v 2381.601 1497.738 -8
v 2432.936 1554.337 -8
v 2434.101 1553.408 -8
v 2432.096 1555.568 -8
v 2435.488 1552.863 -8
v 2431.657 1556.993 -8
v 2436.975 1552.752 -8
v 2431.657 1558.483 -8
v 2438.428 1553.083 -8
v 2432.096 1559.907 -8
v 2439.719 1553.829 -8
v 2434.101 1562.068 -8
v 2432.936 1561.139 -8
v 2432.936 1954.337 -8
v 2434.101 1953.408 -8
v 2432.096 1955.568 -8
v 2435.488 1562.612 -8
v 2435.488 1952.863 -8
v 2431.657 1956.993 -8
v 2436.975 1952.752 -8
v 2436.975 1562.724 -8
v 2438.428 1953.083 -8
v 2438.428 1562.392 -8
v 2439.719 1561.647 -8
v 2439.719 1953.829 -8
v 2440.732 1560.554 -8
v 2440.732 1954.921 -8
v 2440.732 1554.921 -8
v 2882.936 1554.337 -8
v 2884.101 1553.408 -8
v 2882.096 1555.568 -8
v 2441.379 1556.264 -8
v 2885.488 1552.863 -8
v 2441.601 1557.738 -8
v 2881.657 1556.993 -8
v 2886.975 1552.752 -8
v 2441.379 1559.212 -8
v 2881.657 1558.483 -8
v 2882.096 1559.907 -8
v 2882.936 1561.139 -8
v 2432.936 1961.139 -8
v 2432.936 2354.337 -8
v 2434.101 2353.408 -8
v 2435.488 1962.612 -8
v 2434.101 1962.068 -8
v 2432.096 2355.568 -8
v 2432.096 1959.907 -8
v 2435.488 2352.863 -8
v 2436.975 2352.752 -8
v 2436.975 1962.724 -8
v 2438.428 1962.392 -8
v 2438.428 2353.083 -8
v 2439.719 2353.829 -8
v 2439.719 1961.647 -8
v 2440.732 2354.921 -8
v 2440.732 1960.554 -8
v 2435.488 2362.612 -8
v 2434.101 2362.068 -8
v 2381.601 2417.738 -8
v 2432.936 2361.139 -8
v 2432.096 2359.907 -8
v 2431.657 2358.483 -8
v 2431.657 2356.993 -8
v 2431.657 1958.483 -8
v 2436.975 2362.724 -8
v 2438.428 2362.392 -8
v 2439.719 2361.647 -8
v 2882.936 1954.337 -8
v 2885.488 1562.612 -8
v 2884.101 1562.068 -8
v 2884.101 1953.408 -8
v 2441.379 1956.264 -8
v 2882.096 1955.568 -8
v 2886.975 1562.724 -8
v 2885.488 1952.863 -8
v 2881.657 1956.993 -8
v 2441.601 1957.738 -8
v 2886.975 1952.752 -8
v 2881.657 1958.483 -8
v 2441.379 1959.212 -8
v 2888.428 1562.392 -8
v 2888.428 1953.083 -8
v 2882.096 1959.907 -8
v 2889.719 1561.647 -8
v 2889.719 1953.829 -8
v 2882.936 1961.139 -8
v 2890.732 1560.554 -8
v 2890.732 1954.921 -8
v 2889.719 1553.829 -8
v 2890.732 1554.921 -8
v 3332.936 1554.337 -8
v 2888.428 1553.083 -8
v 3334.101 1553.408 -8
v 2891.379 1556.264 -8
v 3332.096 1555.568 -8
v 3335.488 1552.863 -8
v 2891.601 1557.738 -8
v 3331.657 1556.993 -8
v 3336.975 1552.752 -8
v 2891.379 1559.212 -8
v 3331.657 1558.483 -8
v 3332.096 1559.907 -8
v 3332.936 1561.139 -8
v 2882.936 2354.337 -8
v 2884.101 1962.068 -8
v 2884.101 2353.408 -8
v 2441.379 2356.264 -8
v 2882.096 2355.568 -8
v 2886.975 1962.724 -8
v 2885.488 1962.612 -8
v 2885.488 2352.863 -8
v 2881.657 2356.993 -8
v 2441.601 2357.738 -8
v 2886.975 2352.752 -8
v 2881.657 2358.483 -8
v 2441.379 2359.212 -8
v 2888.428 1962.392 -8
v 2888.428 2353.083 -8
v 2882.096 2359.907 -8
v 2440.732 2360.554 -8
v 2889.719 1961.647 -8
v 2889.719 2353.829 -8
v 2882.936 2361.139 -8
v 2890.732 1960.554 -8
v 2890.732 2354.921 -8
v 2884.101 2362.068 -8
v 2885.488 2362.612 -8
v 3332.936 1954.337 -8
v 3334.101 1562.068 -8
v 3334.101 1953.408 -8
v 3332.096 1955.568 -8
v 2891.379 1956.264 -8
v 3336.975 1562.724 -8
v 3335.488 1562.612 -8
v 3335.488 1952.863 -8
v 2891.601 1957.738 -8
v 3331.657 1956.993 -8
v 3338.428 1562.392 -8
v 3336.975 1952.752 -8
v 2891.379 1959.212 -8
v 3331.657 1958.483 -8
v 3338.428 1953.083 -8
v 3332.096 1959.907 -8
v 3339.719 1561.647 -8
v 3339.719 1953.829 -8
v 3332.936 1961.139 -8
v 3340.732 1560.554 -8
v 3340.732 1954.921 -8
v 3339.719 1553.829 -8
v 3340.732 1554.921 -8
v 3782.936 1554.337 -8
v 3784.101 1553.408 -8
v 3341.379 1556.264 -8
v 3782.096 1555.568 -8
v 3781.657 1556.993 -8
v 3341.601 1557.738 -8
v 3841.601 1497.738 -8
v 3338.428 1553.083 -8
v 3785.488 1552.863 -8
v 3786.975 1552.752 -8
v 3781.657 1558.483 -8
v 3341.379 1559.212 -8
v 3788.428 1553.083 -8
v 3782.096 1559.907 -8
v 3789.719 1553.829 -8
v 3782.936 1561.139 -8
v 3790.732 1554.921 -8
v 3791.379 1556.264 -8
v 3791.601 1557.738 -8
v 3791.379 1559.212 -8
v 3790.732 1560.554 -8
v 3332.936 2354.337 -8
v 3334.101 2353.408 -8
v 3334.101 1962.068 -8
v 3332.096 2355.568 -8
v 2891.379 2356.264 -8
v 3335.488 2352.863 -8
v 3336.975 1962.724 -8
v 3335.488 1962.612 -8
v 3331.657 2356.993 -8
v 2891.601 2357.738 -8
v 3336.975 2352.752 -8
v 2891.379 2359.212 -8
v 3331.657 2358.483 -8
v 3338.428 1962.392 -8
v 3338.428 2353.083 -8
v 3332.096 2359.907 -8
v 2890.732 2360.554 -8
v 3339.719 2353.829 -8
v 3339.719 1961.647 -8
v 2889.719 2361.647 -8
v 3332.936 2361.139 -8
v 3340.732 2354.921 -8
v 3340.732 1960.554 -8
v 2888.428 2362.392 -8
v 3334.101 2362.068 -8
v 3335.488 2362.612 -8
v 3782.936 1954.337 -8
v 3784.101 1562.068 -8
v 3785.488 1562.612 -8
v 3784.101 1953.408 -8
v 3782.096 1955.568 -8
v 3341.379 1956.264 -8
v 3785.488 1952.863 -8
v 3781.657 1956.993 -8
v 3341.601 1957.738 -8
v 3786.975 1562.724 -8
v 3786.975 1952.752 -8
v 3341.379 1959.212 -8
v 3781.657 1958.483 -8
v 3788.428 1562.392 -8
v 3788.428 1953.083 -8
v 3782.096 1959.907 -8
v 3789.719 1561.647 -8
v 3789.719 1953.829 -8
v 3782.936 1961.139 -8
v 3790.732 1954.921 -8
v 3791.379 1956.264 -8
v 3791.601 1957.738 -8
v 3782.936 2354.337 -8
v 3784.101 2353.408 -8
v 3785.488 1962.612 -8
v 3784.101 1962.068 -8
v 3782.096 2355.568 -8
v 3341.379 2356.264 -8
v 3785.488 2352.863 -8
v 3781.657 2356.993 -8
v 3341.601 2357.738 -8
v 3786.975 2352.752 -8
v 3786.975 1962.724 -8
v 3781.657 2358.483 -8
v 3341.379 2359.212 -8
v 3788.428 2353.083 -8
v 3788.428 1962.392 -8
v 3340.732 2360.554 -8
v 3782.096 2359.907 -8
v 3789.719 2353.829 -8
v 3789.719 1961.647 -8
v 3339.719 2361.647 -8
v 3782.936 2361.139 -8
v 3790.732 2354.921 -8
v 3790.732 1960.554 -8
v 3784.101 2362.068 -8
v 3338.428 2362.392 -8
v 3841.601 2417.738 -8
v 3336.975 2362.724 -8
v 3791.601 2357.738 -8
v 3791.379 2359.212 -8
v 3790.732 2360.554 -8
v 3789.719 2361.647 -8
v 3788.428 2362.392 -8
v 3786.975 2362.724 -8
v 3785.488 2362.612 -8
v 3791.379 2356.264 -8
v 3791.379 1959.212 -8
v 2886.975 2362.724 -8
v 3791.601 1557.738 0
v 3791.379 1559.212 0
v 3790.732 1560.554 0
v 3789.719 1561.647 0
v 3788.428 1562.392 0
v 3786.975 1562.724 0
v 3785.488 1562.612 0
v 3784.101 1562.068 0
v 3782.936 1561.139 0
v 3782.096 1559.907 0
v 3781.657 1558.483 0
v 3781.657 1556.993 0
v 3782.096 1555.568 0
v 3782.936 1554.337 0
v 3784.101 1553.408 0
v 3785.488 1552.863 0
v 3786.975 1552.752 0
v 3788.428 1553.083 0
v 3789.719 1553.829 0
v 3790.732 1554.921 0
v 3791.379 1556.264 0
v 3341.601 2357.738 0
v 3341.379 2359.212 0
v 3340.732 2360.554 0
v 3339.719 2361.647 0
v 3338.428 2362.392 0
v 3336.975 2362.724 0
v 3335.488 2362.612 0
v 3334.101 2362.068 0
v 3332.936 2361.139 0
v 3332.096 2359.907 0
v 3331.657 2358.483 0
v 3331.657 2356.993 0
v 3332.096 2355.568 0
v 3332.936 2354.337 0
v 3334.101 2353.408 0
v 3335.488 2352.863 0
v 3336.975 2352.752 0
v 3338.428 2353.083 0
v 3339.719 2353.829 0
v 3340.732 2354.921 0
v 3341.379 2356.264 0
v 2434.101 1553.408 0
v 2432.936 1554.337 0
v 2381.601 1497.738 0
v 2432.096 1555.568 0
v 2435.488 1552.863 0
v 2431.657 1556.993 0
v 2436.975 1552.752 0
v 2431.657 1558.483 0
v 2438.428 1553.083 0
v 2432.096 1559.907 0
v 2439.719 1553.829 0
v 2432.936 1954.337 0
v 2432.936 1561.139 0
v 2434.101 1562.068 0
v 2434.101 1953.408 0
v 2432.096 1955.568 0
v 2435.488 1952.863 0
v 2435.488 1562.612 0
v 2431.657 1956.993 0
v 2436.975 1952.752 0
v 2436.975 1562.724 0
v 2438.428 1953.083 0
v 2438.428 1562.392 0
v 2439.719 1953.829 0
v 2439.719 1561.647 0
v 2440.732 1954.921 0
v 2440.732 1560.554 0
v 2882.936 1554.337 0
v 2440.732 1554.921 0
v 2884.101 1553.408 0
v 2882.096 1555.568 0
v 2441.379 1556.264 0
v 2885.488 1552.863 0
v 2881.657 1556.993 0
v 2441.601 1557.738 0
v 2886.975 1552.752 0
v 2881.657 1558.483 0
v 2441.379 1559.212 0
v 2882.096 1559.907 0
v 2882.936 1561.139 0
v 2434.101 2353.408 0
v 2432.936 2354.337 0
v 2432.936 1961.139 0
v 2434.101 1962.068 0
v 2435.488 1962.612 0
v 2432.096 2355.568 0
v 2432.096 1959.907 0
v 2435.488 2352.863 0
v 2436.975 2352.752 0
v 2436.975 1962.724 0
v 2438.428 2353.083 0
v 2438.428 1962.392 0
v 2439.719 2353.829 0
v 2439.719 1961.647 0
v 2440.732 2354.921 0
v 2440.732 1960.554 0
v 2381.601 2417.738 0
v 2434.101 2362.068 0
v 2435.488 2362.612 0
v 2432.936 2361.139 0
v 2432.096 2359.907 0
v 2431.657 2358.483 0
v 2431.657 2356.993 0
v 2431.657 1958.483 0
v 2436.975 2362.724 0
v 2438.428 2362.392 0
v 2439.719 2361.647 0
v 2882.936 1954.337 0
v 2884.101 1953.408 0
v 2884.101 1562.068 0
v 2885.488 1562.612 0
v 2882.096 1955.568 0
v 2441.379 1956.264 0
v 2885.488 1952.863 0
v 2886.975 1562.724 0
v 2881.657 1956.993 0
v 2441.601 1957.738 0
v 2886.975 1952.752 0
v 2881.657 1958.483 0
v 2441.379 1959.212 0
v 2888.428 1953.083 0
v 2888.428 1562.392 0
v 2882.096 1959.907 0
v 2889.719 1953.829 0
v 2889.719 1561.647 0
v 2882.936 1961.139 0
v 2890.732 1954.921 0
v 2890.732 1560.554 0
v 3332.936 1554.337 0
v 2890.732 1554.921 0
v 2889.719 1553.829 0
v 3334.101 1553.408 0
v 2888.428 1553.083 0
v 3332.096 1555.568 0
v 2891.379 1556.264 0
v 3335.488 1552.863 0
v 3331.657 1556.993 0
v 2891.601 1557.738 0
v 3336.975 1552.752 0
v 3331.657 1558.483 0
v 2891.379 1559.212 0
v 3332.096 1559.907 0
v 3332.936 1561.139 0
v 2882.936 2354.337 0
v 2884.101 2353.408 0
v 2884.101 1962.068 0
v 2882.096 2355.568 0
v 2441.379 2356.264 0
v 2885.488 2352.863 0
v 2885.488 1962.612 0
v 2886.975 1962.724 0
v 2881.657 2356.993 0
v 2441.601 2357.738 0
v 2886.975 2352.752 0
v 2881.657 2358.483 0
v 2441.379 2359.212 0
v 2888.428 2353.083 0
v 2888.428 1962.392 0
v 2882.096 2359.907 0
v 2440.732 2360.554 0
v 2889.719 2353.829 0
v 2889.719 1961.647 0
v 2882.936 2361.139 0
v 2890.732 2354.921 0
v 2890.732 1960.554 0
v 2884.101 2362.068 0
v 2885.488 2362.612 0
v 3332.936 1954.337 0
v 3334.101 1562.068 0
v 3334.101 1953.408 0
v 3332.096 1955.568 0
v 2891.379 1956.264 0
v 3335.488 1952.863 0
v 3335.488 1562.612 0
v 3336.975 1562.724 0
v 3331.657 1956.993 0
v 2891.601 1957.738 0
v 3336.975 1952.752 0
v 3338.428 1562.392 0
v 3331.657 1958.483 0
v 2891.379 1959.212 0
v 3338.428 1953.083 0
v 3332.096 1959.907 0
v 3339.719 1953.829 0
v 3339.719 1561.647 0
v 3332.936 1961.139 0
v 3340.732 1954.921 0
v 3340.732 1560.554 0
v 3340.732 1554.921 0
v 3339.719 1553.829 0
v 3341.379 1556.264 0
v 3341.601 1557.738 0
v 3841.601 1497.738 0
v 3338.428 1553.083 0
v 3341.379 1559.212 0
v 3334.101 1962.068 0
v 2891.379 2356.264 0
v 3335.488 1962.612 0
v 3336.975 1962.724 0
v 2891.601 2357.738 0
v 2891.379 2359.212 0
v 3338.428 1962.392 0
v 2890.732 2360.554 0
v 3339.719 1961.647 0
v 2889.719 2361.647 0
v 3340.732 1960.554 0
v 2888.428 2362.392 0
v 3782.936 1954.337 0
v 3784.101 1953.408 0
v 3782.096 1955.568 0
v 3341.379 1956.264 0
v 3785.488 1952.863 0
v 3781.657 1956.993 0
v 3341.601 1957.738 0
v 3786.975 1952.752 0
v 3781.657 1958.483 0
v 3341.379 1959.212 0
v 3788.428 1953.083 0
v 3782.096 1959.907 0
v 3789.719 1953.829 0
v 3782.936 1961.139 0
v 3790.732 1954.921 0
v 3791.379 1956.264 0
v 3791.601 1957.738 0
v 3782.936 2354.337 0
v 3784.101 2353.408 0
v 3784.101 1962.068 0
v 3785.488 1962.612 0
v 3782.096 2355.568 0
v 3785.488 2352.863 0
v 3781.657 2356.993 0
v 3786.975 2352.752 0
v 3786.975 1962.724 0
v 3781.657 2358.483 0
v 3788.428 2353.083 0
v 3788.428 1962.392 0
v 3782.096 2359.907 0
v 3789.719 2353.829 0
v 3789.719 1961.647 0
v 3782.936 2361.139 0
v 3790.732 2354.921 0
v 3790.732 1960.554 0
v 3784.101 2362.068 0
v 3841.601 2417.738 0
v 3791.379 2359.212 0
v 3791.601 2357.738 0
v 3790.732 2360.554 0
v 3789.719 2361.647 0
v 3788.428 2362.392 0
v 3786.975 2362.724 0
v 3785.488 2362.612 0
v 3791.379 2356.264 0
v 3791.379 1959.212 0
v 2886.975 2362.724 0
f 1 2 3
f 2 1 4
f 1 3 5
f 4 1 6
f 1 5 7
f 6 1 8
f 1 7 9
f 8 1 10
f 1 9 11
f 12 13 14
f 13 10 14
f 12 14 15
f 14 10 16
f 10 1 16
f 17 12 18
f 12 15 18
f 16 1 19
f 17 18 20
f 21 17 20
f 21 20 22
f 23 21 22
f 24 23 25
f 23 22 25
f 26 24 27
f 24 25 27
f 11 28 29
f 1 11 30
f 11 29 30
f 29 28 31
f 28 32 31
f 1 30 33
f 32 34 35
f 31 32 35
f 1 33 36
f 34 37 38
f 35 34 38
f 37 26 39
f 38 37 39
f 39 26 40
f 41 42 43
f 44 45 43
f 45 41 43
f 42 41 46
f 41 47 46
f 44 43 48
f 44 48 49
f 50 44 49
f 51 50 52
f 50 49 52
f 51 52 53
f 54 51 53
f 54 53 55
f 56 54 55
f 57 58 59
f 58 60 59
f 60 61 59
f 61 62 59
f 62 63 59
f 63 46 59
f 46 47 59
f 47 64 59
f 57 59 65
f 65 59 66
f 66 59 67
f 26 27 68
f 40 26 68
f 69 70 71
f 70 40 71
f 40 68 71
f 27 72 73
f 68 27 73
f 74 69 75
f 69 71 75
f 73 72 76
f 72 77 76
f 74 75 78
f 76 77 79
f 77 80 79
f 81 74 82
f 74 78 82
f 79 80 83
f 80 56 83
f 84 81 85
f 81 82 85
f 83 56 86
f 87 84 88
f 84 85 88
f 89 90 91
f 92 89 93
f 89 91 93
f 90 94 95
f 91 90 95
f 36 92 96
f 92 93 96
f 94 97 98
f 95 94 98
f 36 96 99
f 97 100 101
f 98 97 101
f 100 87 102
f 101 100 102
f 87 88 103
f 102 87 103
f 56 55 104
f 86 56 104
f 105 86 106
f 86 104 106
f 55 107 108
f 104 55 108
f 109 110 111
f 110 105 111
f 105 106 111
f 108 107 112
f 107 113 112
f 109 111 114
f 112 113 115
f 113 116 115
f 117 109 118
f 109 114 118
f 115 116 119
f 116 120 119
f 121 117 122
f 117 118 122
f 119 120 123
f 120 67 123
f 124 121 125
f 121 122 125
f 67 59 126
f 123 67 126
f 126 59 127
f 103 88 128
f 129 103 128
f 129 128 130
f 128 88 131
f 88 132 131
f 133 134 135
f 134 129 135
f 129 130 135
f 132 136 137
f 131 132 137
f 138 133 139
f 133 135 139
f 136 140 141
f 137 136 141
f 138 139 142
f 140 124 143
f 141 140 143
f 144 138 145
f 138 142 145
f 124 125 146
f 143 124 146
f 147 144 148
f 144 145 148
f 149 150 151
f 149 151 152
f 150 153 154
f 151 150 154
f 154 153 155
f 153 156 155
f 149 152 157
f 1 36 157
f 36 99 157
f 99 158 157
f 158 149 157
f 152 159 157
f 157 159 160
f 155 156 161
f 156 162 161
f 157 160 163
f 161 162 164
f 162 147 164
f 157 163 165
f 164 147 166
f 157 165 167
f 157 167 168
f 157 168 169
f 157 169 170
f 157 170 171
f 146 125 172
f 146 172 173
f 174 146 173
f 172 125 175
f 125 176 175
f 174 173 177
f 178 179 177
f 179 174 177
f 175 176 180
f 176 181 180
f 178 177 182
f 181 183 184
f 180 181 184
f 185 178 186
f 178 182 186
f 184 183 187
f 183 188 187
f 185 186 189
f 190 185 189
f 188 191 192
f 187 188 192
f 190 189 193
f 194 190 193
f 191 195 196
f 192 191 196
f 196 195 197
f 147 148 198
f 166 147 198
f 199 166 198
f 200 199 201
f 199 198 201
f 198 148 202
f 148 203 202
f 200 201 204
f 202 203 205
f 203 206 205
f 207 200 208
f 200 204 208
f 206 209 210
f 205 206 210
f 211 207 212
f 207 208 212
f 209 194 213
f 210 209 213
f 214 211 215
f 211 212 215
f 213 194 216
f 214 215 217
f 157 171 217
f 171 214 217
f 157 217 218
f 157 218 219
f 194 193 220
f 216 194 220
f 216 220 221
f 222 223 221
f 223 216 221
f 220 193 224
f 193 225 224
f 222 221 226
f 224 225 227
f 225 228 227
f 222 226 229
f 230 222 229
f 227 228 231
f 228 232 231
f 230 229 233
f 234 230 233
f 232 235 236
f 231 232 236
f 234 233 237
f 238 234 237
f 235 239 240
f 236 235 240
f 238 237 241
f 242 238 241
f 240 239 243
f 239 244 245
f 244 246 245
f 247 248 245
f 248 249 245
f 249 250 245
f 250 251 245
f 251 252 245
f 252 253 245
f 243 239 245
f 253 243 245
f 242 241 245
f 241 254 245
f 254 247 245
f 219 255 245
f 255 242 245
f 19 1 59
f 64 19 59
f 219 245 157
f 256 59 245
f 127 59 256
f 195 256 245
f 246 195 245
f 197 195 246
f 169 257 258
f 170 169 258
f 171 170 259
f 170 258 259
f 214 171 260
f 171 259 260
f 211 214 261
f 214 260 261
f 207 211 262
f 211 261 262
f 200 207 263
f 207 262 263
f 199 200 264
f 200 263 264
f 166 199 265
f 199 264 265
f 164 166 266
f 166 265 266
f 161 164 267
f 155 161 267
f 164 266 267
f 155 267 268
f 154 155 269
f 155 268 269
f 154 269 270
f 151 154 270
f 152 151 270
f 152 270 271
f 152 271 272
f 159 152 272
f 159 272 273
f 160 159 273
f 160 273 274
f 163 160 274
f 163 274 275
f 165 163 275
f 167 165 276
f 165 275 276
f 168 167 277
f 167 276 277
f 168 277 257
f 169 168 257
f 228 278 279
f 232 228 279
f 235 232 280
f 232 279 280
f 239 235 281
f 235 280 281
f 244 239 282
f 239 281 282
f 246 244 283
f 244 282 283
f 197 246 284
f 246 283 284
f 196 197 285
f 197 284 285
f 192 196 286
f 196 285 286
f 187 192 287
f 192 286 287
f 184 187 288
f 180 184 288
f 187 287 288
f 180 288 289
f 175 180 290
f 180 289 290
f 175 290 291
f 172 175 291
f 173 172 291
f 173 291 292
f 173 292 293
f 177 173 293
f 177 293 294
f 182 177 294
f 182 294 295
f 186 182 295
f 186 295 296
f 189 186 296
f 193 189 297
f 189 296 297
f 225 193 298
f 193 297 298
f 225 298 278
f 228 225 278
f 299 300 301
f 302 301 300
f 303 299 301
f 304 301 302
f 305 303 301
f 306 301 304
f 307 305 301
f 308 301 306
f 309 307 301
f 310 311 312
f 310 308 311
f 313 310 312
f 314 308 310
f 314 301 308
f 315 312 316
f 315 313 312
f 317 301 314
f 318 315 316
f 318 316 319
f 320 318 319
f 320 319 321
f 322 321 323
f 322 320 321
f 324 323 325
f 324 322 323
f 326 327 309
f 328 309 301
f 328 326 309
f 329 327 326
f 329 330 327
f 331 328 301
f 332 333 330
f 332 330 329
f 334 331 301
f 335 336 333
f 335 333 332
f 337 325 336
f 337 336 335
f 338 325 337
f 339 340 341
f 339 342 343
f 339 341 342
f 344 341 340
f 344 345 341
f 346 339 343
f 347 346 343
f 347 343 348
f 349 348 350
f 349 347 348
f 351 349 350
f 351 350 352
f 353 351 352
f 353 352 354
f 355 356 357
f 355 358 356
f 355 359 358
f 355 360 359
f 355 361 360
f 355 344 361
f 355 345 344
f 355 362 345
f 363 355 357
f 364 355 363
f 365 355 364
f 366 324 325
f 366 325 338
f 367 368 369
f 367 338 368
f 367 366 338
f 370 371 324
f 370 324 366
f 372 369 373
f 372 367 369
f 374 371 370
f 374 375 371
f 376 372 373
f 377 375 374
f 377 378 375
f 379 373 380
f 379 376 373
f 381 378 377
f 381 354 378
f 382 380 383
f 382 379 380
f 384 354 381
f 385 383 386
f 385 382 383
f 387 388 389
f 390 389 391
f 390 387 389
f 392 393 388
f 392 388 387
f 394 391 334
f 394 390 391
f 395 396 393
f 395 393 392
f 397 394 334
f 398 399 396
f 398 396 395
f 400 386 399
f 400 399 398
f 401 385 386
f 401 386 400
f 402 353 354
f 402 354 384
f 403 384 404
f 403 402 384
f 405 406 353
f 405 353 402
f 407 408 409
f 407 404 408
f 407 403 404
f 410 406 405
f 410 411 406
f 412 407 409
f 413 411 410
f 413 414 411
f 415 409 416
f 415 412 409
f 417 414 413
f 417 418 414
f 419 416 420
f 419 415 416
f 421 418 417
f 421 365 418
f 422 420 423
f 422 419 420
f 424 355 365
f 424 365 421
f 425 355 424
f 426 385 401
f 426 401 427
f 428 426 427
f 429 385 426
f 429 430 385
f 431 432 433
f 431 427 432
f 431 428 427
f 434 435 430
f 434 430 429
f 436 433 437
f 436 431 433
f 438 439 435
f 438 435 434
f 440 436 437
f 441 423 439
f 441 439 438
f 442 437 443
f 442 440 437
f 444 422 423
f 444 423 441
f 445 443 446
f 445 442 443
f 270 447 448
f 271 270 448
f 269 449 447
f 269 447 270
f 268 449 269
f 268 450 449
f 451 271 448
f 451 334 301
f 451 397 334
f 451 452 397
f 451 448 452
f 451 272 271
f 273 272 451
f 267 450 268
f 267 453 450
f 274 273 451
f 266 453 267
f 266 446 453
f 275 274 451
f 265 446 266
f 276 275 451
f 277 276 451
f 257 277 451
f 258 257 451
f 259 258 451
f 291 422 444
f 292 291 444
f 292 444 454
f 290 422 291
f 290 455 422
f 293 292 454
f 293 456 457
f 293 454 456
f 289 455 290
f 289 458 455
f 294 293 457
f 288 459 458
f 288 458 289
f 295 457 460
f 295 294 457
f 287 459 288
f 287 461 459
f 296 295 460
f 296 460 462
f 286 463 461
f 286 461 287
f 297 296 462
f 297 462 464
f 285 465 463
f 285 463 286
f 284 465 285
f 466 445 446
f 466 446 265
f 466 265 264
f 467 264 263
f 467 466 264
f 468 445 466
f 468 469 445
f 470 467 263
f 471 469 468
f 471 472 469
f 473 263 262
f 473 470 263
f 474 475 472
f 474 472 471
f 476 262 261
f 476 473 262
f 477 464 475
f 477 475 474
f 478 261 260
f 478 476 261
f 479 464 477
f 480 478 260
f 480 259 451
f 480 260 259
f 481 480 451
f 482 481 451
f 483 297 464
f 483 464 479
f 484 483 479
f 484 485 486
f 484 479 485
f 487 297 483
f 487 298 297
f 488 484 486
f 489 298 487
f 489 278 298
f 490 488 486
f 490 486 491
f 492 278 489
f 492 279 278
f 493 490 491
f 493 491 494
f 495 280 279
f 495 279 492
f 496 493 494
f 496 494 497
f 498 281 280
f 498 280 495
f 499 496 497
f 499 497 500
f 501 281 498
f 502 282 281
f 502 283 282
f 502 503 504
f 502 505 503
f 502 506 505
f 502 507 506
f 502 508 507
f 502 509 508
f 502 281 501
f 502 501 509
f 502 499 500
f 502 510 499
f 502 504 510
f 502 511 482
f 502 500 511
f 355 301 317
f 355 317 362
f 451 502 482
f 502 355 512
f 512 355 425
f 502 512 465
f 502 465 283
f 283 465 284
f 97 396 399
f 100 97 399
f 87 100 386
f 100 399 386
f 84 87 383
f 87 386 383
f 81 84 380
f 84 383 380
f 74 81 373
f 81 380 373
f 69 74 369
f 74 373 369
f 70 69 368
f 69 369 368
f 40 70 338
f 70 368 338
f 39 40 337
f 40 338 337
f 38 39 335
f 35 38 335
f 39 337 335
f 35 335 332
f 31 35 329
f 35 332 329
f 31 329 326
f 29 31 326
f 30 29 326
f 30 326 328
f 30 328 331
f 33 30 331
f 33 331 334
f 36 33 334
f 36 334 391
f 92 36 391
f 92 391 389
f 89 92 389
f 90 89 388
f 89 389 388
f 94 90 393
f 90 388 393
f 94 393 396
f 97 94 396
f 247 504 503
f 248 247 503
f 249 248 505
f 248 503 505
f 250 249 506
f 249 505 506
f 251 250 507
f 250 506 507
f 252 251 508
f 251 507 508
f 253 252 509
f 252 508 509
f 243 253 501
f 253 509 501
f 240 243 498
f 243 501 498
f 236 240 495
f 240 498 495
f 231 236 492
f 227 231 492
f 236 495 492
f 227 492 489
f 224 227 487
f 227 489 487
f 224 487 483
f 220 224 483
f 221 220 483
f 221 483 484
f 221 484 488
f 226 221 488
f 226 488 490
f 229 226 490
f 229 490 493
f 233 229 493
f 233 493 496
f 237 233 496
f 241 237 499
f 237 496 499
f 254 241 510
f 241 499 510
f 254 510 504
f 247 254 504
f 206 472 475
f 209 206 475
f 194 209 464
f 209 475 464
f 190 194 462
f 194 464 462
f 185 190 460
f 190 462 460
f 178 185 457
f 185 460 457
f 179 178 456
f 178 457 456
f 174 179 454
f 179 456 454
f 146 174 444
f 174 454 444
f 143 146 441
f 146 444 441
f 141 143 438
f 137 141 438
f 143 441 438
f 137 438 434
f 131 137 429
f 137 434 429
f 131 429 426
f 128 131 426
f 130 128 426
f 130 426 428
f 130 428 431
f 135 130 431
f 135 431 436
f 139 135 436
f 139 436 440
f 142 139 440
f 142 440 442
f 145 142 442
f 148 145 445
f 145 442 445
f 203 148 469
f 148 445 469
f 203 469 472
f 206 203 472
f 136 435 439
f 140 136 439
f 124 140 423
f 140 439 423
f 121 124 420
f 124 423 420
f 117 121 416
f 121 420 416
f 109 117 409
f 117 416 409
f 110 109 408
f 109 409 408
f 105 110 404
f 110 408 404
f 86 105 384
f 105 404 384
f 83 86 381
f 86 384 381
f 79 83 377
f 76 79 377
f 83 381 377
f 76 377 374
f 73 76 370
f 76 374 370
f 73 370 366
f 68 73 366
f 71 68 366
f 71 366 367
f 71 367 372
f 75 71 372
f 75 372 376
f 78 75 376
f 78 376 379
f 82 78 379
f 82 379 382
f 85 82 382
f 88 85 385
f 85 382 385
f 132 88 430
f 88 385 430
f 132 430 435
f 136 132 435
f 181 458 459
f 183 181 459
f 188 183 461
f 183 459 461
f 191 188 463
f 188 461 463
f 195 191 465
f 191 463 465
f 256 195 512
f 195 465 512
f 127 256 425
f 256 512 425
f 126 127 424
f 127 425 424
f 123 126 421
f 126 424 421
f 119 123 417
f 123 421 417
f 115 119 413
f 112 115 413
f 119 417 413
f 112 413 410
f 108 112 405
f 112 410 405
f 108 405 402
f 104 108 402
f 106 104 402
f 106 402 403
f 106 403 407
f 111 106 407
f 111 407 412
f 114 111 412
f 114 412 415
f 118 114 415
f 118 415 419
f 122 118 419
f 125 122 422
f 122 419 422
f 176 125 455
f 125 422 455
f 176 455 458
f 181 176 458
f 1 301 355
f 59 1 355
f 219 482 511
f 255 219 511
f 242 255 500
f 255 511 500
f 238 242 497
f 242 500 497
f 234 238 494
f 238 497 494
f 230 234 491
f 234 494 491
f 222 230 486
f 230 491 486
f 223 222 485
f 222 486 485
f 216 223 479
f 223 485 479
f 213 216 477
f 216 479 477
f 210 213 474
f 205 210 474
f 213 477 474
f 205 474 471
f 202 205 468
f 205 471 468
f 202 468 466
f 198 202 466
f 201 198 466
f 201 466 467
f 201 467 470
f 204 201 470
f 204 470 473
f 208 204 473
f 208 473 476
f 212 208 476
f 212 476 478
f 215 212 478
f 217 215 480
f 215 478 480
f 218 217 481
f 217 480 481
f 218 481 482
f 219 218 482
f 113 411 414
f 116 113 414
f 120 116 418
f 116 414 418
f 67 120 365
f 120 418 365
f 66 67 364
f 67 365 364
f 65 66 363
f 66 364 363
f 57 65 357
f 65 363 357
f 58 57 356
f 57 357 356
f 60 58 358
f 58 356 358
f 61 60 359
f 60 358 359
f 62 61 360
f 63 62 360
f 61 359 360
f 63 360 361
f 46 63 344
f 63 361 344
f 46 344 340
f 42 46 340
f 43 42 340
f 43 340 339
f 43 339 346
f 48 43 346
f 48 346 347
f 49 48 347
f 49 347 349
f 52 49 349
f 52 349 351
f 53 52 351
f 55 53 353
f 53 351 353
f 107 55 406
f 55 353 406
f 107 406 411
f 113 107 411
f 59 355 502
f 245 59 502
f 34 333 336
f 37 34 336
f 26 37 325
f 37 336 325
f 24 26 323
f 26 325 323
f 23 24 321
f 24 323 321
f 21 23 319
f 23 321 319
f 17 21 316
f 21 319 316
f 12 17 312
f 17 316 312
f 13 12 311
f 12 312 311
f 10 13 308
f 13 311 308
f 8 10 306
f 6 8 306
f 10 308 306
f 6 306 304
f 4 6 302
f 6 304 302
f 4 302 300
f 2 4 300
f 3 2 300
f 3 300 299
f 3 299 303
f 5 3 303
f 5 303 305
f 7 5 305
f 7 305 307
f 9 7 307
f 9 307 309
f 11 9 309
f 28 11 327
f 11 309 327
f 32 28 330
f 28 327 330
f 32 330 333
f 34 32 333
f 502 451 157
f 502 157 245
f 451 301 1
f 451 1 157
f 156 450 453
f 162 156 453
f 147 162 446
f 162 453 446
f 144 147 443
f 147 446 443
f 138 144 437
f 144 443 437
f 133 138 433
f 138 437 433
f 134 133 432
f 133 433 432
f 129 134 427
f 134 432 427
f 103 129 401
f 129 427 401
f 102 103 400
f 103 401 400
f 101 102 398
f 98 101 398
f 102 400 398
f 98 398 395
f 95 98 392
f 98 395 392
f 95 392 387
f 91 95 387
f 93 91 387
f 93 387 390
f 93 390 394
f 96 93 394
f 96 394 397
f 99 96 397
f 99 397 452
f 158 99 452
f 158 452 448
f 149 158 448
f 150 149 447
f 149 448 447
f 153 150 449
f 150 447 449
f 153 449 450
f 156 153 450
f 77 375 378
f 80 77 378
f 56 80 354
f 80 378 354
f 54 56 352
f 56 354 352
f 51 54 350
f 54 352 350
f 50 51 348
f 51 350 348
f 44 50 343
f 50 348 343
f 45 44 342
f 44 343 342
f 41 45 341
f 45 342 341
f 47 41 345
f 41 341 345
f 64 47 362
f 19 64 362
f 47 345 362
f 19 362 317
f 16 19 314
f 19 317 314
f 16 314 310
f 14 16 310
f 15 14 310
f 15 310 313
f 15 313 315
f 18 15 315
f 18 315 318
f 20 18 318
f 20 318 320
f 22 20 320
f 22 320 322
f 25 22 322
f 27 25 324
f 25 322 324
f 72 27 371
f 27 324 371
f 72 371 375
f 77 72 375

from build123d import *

# Parameters (mm, degrees)
IZIM1_W            = 1460
IZIM1_H            = 920
IZIM1_R            = 5
TABAN_FLAN_1_DEPTH = 8


# Sheet-metal steps are written as plain solids
with BuildPart() as part:
    # Çizim1 → Taban-Flanş1 (new body)
    with BuildSketch(Plane.XY):
        with Locations((3111.601078197, 1957.737800497)):
            Rectangle(IZIM1_W, IZIM1_H)
        with Locations((2436.601078197, 2357.737800497)):
            Circle(IZIM1_R, mode=Mode.SUBTRACT)
        with Locations((2886.601078197, 2357.737800497)):
            Circle(IZIM1_R, mode=Mode.SUBTRACT)
        with Locations((3336.601078197, 2357.737800497)):
            Circle(IZIM1_R, mode=Mode.SUBTRACT)
        with Locations((3786.601078197, 2357.737800497)):
            Circle(IZIM1_R, mode=Mode.SUBTRACT)
        with Locations((2436.601078197, 1957.737800497)):
            Circle(IZIM1_R, mode=Mode.SUBTRACT)
        with Locations((2886.601078197, 1957.737800497)):
            Circle(IZIM1_R, mode=Mode.SUBTRACT)
        with Locations((3336.601078197, 1957.737800497)):
            Circle(IZIM1_R, mode=Mode.SUBTRACT)
        with Locations((3786.601078197, 1957.737800497)):
            Circle(IZIM1_R, mode=Mode.SUBTRACT)
        with Locations((2436.601078197, 1557.737800497)):
            Circle(IZIM1_R, mode=Mode.SUBTRACT)
        with Locations((2886.601078197, 1557.737800497)):
            Circle(IZIM1_R, mode=Mode.SUBTRACT)
        with Locations((3336.601078197, 1557.737800497)):
            Circle(IZIM1_R, mode=Mode.SUBTRACT)
        with Locations((3786.601078197, 1557.737800497)):
            Circle(IZIM1_R, mode=Mode.SUBTRACT)
    extrude(amount=-TABAN_FLAN_1_DEPTH)


solid = part.part
